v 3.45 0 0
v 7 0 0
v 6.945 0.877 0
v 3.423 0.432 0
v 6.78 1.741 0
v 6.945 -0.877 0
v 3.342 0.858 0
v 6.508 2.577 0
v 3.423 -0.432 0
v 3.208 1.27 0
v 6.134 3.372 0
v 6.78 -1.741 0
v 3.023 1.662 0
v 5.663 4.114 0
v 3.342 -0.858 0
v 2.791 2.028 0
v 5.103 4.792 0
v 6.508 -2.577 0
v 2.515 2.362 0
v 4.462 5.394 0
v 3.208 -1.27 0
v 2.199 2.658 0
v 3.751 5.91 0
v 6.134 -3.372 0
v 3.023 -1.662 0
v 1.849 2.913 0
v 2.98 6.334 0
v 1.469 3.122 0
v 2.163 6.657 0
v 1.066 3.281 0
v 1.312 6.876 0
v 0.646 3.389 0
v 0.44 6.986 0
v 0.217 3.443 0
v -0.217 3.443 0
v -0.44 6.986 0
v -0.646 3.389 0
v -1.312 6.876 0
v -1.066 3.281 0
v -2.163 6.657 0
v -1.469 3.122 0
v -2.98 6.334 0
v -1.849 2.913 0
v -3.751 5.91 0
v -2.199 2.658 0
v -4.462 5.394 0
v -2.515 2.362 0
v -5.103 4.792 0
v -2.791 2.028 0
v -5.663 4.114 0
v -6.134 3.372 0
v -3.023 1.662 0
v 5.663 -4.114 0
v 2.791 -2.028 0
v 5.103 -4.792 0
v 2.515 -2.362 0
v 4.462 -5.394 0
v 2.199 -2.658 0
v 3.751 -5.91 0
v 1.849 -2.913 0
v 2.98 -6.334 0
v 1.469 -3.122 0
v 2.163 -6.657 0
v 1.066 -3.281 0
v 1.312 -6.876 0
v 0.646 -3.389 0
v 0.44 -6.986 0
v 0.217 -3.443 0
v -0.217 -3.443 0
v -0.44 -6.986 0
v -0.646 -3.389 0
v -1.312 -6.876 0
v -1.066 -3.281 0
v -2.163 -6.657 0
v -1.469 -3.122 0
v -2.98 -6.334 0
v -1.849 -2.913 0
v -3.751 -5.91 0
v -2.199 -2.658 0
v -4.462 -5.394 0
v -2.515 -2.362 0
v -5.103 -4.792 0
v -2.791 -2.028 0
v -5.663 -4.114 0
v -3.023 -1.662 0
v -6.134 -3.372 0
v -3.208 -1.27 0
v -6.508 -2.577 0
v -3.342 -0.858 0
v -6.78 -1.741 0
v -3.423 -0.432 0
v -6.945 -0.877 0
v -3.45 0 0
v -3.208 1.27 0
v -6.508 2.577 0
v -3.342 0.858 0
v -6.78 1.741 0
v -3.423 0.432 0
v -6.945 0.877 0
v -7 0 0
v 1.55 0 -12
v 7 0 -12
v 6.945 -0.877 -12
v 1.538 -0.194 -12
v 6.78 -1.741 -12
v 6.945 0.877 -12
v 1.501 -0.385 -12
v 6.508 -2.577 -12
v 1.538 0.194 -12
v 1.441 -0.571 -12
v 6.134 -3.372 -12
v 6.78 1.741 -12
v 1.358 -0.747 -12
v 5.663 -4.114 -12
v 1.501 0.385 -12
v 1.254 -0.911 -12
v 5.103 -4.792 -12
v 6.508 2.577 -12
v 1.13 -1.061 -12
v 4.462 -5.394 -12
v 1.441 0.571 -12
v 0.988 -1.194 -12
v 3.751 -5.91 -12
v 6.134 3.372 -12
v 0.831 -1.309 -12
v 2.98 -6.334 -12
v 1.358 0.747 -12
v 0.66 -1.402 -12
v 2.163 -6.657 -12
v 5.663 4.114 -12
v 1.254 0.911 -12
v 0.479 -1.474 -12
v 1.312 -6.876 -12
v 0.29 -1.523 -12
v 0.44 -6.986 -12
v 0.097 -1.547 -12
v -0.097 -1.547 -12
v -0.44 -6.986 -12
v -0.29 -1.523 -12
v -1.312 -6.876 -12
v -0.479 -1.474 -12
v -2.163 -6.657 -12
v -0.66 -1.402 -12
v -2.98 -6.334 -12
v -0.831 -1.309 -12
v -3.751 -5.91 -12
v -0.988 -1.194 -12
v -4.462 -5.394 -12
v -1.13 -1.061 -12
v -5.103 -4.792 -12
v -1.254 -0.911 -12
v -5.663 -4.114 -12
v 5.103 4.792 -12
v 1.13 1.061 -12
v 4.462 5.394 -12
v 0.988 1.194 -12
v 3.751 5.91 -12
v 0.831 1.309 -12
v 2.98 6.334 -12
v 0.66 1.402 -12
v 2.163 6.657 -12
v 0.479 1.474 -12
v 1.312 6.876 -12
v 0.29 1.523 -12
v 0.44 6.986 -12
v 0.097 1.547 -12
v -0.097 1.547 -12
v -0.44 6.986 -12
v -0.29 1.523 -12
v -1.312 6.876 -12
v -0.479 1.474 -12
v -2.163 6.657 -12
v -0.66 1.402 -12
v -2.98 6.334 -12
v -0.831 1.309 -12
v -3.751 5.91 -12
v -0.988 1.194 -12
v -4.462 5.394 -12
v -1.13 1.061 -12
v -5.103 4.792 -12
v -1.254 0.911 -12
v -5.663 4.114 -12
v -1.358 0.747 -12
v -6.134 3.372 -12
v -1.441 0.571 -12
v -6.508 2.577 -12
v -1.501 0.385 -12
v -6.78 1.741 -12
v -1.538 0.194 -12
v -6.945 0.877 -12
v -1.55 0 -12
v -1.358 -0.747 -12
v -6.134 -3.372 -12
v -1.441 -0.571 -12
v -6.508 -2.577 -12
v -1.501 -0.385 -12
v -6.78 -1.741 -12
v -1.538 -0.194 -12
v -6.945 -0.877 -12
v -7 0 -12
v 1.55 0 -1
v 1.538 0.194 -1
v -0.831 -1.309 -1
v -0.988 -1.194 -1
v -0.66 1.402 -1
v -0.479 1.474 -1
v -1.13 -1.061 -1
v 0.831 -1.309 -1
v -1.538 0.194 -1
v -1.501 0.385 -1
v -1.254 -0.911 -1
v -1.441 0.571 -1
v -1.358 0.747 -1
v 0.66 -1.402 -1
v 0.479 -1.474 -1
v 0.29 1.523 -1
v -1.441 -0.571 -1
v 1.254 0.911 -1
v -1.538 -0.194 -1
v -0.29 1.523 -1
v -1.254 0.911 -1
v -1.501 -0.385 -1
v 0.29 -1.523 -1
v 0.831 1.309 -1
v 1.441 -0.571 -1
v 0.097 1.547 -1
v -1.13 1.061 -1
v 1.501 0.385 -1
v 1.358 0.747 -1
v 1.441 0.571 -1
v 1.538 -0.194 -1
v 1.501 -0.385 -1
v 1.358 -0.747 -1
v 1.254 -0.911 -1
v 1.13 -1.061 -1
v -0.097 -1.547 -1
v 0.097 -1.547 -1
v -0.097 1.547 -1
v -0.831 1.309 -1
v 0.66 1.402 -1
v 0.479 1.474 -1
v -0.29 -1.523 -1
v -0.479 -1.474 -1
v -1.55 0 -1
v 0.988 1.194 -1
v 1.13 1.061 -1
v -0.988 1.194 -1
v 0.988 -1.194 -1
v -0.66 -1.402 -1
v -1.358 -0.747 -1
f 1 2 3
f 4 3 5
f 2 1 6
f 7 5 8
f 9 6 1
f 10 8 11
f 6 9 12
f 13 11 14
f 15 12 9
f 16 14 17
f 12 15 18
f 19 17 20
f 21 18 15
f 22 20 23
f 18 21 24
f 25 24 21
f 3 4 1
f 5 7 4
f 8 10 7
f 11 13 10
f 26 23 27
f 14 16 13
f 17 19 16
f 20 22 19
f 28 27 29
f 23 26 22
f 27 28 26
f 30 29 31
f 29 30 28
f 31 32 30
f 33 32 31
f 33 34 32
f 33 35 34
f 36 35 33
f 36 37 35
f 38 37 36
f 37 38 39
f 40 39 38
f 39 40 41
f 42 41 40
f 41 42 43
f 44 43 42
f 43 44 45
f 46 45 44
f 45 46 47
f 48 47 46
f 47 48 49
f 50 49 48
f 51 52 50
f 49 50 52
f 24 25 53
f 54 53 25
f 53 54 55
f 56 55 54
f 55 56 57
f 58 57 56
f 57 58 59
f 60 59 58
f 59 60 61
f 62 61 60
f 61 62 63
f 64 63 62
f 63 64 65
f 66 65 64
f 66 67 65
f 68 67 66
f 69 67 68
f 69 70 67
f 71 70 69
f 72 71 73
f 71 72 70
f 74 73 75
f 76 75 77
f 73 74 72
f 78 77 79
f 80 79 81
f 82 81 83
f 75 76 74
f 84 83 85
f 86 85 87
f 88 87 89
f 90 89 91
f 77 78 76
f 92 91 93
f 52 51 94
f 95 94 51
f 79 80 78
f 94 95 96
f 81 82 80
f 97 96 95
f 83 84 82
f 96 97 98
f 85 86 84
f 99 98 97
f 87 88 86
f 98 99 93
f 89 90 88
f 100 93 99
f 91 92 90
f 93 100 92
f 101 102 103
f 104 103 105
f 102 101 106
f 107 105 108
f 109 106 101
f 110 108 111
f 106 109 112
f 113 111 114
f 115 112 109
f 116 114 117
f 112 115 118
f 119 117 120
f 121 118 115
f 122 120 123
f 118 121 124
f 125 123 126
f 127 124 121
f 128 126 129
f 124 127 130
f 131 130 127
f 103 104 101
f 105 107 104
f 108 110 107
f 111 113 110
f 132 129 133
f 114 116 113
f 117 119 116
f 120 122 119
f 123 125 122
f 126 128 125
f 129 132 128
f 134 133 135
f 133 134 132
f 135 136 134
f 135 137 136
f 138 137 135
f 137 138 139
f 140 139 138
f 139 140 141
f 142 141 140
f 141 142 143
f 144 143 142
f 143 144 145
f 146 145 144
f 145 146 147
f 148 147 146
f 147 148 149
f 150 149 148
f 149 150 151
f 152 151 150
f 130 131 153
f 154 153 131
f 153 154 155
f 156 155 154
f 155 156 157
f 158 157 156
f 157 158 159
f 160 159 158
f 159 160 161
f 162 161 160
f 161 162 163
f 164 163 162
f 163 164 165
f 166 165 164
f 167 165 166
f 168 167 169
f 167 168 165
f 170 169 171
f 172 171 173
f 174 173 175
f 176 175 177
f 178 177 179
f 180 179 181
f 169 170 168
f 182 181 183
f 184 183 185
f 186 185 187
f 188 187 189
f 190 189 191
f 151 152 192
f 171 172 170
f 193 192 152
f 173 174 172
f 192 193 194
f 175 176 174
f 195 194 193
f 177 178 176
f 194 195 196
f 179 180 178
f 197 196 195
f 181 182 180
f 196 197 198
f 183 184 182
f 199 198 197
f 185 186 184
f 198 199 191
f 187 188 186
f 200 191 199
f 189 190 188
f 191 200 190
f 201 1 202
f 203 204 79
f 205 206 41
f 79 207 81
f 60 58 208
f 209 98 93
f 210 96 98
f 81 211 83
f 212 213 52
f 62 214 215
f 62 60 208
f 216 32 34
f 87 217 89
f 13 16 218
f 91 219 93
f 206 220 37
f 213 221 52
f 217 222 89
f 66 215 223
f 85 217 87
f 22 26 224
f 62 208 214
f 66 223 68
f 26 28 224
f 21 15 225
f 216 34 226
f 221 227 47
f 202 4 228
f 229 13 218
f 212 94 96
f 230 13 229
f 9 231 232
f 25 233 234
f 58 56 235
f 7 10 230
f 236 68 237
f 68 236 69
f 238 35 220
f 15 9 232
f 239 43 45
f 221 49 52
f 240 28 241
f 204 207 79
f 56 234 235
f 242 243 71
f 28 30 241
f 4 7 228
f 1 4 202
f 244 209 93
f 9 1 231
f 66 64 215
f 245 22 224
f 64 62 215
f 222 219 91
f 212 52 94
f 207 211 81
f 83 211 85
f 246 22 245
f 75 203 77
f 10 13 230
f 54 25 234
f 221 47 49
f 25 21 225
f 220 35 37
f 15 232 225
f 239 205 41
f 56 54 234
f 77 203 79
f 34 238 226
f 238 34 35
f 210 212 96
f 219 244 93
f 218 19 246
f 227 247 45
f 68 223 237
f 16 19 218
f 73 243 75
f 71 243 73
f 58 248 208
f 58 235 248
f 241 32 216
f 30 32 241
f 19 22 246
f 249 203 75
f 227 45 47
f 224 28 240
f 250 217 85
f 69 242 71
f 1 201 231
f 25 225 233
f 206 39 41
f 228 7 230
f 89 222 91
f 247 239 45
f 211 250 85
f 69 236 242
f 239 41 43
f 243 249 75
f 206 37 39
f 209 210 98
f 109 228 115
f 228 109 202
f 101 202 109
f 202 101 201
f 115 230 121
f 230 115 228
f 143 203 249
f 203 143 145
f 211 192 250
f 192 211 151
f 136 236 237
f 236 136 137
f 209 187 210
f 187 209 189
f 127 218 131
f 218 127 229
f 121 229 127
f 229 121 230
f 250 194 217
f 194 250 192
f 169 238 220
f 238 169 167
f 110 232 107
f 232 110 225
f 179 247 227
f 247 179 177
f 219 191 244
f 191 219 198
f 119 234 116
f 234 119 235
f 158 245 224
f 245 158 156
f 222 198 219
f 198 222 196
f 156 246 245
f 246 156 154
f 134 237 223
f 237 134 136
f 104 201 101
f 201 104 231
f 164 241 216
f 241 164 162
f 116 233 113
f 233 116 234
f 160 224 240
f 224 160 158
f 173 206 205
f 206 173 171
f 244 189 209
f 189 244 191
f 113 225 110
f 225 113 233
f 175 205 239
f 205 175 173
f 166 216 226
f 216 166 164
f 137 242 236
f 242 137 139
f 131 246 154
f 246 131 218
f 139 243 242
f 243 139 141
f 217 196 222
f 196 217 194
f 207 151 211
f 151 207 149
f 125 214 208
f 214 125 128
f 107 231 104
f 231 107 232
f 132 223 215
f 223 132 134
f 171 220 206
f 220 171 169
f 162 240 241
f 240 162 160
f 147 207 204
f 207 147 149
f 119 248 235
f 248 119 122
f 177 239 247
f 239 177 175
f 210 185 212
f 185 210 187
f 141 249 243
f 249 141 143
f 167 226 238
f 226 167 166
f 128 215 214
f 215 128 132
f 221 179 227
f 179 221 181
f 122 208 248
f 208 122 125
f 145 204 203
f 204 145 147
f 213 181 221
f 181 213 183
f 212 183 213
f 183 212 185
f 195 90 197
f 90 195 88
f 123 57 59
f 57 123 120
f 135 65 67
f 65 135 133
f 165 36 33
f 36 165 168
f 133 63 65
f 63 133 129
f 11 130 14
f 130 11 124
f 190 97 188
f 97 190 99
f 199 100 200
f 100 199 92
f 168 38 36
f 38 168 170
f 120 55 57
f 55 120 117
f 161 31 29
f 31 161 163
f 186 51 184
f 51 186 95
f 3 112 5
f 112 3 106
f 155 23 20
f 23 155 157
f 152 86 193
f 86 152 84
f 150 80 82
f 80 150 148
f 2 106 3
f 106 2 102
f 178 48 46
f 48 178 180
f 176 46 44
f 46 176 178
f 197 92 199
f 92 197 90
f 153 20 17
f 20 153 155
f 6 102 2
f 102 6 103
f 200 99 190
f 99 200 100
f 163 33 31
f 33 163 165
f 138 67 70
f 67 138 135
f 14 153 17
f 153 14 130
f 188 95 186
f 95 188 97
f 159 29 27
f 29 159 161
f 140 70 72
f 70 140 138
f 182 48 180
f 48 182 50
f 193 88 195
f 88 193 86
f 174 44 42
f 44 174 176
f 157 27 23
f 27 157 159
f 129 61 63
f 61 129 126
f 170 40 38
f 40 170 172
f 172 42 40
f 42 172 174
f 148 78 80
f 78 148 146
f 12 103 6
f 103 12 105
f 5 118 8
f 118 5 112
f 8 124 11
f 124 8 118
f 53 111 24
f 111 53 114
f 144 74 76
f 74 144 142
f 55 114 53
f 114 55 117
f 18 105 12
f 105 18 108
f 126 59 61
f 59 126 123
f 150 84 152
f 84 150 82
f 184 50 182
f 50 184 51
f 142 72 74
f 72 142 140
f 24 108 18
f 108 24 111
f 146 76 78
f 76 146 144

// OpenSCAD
$fn = 50;


difference() {
	union() {
		translate(v = [0, 0, -12.0000000000]) {
			cylinder(h = 12, r = 7.0000000000);
		}
	}
	union() {
		translate(v = [0, 0, 0]) {
			rotate(a = [0, 0, 0]) {
				difference() {
					union() {
						translate(v = [0, 0, -12.0000000000]) {
							cylinder(h = 12, r = 1.2500000000);
						}
						translate(v = [0, 0, -1.0000000000]) {
							cylinder(h = 1.0000000000, r1 = 1.5500000000, r2 = 3.4500000000);
						}
						translate(v = [0, 0, -12.0000000000]) {
							cylinder(h = 12, r = 1.5500000000);
						}
						translate(v = [0, 0, -12.0000000000]) {
							cylinder(h = 12, r = 1.2500000000);
						}
					}
					union();
				}
			}
		}
	}
}
